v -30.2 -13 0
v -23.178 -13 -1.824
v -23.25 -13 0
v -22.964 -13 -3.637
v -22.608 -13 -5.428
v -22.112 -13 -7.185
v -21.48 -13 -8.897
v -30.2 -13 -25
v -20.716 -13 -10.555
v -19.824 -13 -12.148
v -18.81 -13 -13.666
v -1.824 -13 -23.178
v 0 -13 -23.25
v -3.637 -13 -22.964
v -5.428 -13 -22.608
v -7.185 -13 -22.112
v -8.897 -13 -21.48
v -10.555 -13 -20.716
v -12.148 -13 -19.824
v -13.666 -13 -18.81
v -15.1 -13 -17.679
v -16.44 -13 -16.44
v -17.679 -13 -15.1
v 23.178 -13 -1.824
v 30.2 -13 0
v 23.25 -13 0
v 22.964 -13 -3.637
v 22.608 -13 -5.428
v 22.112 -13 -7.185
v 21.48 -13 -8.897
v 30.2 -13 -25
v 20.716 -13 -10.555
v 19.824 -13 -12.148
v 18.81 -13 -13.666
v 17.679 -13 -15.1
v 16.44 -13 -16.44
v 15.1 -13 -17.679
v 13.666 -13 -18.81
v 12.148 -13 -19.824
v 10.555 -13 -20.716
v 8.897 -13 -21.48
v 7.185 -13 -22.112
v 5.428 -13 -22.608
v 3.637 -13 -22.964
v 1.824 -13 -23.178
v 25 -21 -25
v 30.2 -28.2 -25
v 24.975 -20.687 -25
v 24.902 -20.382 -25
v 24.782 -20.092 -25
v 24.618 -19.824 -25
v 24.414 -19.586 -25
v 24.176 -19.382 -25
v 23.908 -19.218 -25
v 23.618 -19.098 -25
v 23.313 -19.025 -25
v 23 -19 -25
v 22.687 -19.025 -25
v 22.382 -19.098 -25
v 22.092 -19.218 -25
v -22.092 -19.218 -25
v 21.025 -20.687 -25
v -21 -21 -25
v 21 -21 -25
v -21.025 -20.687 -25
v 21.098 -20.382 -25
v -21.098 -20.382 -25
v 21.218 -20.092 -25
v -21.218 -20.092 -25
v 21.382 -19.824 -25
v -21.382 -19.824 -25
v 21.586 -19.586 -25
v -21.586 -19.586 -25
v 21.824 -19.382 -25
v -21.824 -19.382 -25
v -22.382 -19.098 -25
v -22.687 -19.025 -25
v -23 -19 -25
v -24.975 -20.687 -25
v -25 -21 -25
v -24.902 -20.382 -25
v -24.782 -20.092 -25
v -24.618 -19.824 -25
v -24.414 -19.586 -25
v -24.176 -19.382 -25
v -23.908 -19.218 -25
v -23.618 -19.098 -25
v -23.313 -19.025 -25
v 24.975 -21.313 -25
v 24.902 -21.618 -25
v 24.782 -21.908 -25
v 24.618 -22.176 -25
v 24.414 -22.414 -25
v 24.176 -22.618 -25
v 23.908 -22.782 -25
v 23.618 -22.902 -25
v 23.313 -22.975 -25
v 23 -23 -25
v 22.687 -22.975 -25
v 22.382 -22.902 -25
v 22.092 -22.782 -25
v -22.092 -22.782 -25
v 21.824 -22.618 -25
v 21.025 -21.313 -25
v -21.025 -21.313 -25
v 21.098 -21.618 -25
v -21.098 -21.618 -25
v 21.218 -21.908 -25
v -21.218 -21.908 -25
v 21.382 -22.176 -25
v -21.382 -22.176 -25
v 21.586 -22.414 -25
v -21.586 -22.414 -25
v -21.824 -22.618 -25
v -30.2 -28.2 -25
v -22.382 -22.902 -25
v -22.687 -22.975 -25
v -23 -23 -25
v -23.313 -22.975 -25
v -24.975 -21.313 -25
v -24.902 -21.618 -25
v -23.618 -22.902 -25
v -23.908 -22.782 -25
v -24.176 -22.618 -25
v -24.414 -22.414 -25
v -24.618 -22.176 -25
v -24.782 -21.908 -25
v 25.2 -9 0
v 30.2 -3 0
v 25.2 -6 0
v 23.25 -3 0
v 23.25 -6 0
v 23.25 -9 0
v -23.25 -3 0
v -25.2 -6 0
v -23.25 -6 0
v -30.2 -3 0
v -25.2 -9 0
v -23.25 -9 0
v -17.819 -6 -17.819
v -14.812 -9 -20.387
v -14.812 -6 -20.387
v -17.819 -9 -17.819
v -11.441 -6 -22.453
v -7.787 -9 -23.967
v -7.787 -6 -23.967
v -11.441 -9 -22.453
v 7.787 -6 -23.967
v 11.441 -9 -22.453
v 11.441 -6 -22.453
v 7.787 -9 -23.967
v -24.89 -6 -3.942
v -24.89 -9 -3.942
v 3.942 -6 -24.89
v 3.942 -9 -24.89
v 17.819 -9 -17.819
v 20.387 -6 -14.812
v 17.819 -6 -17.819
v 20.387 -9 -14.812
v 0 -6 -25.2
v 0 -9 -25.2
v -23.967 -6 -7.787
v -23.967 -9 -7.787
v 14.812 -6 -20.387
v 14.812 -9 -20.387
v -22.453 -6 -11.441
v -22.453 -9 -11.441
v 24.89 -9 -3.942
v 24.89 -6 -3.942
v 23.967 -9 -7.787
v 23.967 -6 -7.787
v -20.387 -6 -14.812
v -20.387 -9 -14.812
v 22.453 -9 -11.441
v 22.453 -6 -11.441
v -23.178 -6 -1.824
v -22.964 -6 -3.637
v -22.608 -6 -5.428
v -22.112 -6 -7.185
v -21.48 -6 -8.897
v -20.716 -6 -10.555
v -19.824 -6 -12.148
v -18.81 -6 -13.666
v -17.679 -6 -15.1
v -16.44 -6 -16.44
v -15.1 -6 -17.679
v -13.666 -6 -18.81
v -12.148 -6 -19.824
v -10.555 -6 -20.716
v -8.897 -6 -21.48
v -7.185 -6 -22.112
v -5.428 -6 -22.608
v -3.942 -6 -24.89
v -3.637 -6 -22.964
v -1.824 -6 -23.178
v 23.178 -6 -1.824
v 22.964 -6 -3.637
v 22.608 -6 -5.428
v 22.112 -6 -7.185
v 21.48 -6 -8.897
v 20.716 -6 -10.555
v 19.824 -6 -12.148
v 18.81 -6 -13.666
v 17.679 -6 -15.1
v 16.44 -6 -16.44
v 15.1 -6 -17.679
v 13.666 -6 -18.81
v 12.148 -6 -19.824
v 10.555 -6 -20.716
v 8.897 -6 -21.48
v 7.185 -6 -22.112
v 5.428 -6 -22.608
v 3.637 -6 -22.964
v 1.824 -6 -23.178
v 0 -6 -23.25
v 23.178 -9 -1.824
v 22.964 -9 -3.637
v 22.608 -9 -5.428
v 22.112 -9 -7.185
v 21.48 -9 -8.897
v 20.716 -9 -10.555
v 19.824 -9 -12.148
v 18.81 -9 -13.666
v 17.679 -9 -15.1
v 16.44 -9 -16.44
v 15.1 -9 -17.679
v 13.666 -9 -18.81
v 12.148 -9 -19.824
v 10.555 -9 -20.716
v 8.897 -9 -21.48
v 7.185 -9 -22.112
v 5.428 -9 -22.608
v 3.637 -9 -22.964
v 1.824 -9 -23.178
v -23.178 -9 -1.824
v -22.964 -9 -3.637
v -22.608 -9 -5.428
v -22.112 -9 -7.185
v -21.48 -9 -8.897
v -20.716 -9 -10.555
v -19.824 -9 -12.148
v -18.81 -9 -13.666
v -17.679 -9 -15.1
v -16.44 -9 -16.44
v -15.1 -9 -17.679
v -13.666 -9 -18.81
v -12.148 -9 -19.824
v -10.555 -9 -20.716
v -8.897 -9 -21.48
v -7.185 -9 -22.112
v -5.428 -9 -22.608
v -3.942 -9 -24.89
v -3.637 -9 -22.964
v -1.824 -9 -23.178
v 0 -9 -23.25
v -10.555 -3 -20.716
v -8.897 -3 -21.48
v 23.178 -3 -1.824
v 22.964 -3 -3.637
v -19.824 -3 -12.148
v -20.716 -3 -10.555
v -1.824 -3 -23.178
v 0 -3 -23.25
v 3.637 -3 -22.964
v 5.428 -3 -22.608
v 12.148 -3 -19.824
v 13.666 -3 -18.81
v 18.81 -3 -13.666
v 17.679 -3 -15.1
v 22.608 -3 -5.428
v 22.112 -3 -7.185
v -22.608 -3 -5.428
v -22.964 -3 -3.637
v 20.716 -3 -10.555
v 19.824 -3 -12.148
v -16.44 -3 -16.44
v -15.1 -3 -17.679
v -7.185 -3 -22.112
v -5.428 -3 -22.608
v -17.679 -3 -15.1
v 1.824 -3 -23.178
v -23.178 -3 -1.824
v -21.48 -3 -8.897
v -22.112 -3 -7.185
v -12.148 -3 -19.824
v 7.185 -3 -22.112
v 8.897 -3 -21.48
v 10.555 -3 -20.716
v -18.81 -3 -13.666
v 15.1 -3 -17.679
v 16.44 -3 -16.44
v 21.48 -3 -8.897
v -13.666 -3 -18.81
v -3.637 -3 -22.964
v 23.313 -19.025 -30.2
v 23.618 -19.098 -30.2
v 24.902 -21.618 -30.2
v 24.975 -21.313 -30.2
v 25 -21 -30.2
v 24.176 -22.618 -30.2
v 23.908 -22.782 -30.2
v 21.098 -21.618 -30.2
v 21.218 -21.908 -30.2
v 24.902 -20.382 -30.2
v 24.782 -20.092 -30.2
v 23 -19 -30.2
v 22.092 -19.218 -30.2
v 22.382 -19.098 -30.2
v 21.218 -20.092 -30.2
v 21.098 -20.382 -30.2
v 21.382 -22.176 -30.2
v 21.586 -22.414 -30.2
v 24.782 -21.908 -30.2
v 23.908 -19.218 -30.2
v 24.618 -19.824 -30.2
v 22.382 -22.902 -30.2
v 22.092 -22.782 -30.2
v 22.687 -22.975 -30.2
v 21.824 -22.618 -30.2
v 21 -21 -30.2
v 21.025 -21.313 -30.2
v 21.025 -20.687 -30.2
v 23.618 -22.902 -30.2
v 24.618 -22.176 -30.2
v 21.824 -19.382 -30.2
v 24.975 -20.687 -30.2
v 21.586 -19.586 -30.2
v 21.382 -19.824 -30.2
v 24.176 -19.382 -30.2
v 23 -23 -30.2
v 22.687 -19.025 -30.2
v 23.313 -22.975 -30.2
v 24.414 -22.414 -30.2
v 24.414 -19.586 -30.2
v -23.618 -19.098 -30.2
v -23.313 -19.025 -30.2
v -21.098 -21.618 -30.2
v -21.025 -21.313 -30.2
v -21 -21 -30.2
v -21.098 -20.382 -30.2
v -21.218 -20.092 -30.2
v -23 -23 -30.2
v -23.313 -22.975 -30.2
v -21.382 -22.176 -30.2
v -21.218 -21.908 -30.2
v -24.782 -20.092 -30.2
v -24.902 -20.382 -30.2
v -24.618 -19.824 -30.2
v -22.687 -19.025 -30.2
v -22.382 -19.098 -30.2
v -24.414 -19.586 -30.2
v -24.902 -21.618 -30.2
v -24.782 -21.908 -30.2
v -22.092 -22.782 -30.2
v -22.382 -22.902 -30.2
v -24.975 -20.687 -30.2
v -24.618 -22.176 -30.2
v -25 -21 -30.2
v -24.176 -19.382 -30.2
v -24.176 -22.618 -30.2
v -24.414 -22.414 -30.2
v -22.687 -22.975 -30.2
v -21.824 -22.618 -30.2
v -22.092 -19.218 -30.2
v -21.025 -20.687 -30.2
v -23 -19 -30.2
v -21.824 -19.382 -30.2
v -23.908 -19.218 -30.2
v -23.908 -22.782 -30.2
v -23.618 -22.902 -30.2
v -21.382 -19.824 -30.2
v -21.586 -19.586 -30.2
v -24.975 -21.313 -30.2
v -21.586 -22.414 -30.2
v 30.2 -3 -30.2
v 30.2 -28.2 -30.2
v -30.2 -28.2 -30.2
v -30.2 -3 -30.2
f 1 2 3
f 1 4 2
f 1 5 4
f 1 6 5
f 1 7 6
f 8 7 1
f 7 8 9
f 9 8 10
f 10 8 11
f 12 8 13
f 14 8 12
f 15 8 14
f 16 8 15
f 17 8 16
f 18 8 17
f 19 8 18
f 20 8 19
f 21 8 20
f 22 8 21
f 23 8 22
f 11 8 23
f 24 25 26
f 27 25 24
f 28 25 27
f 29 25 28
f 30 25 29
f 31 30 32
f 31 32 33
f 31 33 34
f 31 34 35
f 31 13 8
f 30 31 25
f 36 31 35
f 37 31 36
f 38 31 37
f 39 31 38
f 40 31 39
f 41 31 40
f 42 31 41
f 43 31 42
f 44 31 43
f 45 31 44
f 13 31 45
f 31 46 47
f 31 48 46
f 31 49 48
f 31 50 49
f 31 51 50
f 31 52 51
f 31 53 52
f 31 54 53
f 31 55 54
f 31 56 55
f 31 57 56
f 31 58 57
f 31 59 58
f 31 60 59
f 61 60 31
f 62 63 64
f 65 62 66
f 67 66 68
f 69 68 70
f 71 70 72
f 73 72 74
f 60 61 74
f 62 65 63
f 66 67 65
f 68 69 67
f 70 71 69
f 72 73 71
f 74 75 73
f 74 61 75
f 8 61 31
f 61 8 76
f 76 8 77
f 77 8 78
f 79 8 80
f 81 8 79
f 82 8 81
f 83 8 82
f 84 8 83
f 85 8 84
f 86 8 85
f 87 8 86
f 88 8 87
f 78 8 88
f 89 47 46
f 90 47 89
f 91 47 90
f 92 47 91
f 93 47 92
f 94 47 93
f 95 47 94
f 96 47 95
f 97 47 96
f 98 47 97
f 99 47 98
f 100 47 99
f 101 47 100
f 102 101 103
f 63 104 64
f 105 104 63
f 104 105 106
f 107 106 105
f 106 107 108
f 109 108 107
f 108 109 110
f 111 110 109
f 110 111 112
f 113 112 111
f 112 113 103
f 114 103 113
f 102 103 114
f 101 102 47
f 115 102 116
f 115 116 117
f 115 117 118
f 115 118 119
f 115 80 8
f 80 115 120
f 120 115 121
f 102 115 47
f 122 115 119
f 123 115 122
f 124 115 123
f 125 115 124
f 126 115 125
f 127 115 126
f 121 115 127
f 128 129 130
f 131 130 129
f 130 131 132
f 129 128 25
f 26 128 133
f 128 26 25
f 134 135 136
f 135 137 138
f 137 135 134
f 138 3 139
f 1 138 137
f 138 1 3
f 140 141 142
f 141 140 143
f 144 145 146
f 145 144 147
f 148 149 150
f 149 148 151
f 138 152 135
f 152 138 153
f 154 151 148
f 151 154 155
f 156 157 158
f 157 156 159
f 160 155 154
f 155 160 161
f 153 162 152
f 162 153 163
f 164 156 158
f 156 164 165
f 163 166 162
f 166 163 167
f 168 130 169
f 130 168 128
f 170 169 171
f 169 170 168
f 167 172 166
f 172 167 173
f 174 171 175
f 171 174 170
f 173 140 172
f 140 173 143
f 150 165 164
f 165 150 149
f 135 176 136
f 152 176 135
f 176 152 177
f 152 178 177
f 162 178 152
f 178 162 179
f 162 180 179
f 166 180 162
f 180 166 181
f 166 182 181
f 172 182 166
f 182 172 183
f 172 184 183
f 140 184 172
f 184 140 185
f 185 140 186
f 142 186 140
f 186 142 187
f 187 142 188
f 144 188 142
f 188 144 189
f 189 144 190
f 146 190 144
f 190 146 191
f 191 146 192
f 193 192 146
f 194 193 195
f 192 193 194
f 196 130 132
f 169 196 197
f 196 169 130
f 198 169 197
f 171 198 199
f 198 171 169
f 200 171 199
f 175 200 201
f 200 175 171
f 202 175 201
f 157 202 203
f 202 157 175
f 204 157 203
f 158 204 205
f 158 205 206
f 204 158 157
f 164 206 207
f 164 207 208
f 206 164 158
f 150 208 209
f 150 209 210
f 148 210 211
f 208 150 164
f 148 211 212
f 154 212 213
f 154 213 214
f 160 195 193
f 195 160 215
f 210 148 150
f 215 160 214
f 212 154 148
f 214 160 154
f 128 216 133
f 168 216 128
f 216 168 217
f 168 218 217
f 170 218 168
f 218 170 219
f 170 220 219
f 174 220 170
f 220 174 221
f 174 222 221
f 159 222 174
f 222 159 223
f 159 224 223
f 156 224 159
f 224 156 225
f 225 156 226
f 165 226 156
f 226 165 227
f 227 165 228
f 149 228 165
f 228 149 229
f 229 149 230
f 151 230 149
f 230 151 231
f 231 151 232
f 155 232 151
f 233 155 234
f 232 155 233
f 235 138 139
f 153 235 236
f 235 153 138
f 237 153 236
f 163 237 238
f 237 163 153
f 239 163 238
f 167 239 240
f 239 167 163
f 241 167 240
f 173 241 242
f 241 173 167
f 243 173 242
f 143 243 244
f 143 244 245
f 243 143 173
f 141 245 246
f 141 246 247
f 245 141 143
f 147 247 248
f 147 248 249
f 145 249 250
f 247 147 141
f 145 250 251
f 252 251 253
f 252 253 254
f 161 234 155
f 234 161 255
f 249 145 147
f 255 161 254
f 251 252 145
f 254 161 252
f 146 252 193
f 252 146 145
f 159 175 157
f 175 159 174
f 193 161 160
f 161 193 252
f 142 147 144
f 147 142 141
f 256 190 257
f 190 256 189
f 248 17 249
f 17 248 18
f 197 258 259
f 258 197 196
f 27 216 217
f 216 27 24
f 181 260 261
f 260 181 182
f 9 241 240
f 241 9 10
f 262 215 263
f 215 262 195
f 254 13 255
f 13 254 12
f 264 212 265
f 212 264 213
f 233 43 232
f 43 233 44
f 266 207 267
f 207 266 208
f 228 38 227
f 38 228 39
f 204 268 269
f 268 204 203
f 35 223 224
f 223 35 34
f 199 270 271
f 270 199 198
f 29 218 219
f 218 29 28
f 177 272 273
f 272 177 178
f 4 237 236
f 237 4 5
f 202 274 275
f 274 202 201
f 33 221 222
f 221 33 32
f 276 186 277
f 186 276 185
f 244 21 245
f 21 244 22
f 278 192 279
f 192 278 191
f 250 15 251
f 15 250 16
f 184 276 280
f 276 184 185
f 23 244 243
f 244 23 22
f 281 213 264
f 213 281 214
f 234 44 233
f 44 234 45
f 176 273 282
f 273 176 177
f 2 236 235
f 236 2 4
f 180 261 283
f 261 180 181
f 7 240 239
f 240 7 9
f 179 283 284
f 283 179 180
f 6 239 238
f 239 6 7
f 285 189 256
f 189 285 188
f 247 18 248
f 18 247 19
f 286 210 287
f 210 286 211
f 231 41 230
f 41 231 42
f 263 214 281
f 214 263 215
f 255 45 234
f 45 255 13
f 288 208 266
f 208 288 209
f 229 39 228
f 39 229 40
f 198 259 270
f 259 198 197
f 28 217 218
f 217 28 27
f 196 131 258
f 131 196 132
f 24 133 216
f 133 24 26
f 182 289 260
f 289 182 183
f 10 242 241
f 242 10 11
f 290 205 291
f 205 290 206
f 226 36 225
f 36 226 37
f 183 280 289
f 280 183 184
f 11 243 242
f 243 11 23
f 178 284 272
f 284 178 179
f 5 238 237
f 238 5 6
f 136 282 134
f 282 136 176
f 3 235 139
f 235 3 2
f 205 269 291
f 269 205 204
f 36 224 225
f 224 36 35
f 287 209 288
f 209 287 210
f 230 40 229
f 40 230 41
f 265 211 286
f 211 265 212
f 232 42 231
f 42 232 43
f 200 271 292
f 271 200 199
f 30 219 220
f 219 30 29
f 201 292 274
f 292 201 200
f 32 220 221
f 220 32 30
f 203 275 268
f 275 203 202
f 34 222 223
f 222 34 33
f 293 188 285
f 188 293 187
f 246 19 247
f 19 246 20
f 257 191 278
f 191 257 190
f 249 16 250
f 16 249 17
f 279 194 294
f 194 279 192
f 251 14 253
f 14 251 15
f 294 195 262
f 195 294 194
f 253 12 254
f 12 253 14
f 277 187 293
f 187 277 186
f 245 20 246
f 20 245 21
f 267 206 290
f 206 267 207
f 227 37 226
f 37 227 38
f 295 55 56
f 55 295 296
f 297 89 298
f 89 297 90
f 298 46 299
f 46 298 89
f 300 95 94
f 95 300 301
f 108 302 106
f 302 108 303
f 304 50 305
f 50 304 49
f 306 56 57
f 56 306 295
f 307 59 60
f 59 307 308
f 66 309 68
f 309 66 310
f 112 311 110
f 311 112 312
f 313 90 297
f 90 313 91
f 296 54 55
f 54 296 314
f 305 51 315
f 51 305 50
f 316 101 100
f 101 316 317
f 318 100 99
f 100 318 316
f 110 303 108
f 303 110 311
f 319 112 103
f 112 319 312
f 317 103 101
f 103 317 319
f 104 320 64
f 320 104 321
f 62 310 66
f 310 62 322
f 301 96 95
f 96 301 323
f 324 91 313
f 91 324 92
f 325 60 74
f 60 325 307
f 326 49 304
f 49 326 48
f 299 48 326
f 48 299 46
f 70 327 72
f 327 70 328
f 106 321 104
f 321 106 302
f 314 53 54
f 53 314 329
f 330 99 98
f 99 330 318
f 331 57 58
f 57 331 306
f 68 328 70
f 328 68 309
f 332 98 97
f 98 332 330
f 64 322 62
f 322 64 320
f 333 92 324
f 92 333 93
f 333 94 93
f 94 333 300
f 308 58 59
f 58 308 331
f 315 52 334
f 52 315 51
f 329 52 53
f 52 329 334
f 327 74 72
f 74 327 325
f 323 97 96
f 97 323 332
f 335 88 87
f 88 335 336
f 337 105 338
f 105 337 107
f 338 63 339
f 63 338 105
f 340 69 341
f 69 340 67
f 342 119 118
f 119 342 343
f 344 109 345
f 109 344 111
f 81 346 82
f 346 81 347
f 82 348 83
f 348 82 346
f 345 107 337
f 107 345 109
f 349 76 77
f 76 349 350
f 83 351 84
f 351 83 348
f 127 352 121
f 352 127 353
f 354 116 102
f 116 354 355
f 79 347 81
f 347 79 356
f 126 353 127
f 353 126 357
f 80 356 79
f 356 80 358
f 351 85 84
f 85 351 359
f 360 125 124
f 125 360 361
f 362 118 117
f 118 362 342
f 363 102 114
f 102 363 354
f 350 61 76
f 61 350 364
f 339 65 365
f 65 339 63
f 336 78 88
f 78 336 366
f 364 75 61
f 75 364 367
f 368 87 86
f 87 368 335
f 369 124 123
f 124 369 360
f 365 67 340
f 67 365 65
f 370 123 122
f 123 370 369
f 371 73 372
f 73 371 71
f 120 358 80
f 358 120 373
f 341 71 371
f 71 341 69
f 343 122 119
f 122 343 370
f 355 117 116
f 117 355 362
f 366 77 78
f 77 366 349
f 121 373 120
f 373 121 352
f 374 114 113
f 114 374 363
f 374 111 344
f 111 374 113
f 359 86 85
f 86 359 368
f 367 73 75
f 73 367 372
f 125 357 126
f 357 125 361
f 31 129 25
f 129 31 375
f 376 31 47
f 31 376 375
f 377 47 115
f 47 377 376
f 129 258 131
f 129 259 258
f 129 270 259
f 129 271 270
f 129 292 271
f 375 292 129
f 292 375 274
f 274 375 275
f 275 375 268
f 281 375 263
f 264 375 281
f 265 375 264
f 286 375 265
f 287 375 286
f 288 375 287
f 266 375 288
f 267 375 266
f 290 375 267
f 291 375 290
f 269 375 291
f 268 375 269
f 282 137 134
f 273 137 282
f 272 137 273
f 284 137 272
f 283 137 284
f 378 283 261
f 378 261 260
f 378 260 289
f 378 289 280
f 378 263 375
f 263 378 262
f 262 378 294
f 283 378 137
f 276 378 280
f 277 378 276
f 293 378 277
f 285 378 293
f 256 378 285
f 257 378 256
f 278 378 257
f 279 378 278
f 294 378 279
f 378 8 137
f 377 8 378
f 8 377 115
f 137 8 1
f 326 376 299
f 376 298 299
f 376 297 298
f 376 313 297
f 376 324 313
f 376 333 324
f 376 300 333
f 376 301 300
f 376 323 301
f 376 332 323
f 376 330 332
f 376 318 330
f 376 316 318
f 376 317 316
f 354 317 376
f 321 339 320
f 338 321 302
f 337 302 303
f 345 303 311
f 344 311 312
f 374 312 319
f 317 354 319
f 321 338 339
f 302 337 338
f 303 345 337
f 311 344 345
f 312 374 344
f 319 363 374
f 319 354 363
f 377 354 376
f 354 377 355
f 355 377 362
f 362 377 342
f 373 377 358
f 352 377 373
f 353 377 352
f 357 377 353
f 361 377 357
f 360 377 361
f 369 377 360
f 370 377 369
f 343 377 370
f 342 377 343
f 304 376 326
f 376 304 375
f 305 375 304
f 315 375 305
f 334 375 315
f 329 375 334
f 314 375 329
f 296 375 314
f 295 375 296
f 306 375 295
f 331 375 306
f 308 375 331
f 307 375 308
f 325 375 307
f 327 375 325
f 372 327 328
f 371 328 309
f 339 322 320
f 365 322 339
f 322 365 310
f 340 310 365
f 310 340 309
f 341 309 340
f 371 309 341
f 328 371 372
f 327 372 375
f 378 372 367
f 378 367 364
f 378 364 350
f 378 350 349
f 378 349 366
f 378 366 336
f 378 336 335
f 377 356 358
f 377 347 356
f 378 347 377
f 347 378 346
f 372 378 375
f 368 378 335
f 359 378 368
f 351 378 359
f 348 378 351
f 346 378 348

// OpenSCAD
// Lens Holder for 50mm plano-convex collimator / projector lens
// Lens: http://www.ebay.com/itm/161126916191
// by John Beale, April 2014

// Lens OD: 50mm
// Lens Rim diameter: 46.2
// Rim edge thickness: 3mm
// Lens Height: 22mm
// Focal Length: 24mm (for reference only)

// lens outer edge diameter
diam = 50.4;  // at 50.4, measured print: 50.40

// lens mounting rim diameter
lrdiam = 46.5;  // at 46.5, measured print: 46.59

// lens edge thickness
thick = 3.0;  // at 3.0, measured print: 2.58 - 2.76

// ==================================================
// measured print width = 60.17 mm base, 61.17 mm top
// across lens, outside thick: 10.11 - 10.28
// thick at foot: 25.24 - 25.35 mm
// height at foot: 5.49 - 5.57 mm
// diam of screw hole: 3.55 - 3.78 mm
// ==================================================

// overall thickness
lh = 20;

eps=0.05*1;
$fa=5*1;
$fs=0.2*1;

rotate([90,0,0])
lensbracket(diam, thick, lh);

wthick = 5;  // wall thickness of lens support

module lensbracket(d, t, lh) // f=0.85
{
  translate([0,0,1]) scale([1,1,1])
  difference()
  {
    // rotate(0,[0,0,0]) 
    // translate([0,0,-1]) scale([1,1,1])
    union()
    { 
     // square base
     translate([-d/2-wthick,-(d/2)-wthick,2]) cube([d+(wthick*2),d,d/2]);
    } 
	 translate([0,0,5])
    lenscutter(d,t);
  }
}

csize = 80;
sdiam = 4.0;  // diameter of mounting screw
fdepth = 5;  // depth of mounting foot
fthick = 7;  // forward extension of mounting foot

module lenscutter(d,t)
{  union()
   {
         // cut off porch leaving mounting foot
     translate([-(csize/2),fdepth-30,fthick]) cube([csize+2, csize+2, csize+2]);  

		 // cut off top half
     translate([-49,0,-50]) cube([csize+eps, csize+eps, csize+eps]);

     cylinder(h=t,r=(d/2),$fn=40);  // lens rim

     translate([0,0,-25])
      cylinder(h=100,r=((lrdiam)/2),$fn=80);  // optical path through-clearance

     translate([23,0,15])  rotate([90,0,0]) 
        cylinder(h=100,r=((sdiam)/2),$fn=40);  // mounting screw
     translate([-23,0,15]) rotate([90,0,0])
        cylinder(h=100,r=((sdiam)/2),$fn=40);  // mounting screw

   }
}
